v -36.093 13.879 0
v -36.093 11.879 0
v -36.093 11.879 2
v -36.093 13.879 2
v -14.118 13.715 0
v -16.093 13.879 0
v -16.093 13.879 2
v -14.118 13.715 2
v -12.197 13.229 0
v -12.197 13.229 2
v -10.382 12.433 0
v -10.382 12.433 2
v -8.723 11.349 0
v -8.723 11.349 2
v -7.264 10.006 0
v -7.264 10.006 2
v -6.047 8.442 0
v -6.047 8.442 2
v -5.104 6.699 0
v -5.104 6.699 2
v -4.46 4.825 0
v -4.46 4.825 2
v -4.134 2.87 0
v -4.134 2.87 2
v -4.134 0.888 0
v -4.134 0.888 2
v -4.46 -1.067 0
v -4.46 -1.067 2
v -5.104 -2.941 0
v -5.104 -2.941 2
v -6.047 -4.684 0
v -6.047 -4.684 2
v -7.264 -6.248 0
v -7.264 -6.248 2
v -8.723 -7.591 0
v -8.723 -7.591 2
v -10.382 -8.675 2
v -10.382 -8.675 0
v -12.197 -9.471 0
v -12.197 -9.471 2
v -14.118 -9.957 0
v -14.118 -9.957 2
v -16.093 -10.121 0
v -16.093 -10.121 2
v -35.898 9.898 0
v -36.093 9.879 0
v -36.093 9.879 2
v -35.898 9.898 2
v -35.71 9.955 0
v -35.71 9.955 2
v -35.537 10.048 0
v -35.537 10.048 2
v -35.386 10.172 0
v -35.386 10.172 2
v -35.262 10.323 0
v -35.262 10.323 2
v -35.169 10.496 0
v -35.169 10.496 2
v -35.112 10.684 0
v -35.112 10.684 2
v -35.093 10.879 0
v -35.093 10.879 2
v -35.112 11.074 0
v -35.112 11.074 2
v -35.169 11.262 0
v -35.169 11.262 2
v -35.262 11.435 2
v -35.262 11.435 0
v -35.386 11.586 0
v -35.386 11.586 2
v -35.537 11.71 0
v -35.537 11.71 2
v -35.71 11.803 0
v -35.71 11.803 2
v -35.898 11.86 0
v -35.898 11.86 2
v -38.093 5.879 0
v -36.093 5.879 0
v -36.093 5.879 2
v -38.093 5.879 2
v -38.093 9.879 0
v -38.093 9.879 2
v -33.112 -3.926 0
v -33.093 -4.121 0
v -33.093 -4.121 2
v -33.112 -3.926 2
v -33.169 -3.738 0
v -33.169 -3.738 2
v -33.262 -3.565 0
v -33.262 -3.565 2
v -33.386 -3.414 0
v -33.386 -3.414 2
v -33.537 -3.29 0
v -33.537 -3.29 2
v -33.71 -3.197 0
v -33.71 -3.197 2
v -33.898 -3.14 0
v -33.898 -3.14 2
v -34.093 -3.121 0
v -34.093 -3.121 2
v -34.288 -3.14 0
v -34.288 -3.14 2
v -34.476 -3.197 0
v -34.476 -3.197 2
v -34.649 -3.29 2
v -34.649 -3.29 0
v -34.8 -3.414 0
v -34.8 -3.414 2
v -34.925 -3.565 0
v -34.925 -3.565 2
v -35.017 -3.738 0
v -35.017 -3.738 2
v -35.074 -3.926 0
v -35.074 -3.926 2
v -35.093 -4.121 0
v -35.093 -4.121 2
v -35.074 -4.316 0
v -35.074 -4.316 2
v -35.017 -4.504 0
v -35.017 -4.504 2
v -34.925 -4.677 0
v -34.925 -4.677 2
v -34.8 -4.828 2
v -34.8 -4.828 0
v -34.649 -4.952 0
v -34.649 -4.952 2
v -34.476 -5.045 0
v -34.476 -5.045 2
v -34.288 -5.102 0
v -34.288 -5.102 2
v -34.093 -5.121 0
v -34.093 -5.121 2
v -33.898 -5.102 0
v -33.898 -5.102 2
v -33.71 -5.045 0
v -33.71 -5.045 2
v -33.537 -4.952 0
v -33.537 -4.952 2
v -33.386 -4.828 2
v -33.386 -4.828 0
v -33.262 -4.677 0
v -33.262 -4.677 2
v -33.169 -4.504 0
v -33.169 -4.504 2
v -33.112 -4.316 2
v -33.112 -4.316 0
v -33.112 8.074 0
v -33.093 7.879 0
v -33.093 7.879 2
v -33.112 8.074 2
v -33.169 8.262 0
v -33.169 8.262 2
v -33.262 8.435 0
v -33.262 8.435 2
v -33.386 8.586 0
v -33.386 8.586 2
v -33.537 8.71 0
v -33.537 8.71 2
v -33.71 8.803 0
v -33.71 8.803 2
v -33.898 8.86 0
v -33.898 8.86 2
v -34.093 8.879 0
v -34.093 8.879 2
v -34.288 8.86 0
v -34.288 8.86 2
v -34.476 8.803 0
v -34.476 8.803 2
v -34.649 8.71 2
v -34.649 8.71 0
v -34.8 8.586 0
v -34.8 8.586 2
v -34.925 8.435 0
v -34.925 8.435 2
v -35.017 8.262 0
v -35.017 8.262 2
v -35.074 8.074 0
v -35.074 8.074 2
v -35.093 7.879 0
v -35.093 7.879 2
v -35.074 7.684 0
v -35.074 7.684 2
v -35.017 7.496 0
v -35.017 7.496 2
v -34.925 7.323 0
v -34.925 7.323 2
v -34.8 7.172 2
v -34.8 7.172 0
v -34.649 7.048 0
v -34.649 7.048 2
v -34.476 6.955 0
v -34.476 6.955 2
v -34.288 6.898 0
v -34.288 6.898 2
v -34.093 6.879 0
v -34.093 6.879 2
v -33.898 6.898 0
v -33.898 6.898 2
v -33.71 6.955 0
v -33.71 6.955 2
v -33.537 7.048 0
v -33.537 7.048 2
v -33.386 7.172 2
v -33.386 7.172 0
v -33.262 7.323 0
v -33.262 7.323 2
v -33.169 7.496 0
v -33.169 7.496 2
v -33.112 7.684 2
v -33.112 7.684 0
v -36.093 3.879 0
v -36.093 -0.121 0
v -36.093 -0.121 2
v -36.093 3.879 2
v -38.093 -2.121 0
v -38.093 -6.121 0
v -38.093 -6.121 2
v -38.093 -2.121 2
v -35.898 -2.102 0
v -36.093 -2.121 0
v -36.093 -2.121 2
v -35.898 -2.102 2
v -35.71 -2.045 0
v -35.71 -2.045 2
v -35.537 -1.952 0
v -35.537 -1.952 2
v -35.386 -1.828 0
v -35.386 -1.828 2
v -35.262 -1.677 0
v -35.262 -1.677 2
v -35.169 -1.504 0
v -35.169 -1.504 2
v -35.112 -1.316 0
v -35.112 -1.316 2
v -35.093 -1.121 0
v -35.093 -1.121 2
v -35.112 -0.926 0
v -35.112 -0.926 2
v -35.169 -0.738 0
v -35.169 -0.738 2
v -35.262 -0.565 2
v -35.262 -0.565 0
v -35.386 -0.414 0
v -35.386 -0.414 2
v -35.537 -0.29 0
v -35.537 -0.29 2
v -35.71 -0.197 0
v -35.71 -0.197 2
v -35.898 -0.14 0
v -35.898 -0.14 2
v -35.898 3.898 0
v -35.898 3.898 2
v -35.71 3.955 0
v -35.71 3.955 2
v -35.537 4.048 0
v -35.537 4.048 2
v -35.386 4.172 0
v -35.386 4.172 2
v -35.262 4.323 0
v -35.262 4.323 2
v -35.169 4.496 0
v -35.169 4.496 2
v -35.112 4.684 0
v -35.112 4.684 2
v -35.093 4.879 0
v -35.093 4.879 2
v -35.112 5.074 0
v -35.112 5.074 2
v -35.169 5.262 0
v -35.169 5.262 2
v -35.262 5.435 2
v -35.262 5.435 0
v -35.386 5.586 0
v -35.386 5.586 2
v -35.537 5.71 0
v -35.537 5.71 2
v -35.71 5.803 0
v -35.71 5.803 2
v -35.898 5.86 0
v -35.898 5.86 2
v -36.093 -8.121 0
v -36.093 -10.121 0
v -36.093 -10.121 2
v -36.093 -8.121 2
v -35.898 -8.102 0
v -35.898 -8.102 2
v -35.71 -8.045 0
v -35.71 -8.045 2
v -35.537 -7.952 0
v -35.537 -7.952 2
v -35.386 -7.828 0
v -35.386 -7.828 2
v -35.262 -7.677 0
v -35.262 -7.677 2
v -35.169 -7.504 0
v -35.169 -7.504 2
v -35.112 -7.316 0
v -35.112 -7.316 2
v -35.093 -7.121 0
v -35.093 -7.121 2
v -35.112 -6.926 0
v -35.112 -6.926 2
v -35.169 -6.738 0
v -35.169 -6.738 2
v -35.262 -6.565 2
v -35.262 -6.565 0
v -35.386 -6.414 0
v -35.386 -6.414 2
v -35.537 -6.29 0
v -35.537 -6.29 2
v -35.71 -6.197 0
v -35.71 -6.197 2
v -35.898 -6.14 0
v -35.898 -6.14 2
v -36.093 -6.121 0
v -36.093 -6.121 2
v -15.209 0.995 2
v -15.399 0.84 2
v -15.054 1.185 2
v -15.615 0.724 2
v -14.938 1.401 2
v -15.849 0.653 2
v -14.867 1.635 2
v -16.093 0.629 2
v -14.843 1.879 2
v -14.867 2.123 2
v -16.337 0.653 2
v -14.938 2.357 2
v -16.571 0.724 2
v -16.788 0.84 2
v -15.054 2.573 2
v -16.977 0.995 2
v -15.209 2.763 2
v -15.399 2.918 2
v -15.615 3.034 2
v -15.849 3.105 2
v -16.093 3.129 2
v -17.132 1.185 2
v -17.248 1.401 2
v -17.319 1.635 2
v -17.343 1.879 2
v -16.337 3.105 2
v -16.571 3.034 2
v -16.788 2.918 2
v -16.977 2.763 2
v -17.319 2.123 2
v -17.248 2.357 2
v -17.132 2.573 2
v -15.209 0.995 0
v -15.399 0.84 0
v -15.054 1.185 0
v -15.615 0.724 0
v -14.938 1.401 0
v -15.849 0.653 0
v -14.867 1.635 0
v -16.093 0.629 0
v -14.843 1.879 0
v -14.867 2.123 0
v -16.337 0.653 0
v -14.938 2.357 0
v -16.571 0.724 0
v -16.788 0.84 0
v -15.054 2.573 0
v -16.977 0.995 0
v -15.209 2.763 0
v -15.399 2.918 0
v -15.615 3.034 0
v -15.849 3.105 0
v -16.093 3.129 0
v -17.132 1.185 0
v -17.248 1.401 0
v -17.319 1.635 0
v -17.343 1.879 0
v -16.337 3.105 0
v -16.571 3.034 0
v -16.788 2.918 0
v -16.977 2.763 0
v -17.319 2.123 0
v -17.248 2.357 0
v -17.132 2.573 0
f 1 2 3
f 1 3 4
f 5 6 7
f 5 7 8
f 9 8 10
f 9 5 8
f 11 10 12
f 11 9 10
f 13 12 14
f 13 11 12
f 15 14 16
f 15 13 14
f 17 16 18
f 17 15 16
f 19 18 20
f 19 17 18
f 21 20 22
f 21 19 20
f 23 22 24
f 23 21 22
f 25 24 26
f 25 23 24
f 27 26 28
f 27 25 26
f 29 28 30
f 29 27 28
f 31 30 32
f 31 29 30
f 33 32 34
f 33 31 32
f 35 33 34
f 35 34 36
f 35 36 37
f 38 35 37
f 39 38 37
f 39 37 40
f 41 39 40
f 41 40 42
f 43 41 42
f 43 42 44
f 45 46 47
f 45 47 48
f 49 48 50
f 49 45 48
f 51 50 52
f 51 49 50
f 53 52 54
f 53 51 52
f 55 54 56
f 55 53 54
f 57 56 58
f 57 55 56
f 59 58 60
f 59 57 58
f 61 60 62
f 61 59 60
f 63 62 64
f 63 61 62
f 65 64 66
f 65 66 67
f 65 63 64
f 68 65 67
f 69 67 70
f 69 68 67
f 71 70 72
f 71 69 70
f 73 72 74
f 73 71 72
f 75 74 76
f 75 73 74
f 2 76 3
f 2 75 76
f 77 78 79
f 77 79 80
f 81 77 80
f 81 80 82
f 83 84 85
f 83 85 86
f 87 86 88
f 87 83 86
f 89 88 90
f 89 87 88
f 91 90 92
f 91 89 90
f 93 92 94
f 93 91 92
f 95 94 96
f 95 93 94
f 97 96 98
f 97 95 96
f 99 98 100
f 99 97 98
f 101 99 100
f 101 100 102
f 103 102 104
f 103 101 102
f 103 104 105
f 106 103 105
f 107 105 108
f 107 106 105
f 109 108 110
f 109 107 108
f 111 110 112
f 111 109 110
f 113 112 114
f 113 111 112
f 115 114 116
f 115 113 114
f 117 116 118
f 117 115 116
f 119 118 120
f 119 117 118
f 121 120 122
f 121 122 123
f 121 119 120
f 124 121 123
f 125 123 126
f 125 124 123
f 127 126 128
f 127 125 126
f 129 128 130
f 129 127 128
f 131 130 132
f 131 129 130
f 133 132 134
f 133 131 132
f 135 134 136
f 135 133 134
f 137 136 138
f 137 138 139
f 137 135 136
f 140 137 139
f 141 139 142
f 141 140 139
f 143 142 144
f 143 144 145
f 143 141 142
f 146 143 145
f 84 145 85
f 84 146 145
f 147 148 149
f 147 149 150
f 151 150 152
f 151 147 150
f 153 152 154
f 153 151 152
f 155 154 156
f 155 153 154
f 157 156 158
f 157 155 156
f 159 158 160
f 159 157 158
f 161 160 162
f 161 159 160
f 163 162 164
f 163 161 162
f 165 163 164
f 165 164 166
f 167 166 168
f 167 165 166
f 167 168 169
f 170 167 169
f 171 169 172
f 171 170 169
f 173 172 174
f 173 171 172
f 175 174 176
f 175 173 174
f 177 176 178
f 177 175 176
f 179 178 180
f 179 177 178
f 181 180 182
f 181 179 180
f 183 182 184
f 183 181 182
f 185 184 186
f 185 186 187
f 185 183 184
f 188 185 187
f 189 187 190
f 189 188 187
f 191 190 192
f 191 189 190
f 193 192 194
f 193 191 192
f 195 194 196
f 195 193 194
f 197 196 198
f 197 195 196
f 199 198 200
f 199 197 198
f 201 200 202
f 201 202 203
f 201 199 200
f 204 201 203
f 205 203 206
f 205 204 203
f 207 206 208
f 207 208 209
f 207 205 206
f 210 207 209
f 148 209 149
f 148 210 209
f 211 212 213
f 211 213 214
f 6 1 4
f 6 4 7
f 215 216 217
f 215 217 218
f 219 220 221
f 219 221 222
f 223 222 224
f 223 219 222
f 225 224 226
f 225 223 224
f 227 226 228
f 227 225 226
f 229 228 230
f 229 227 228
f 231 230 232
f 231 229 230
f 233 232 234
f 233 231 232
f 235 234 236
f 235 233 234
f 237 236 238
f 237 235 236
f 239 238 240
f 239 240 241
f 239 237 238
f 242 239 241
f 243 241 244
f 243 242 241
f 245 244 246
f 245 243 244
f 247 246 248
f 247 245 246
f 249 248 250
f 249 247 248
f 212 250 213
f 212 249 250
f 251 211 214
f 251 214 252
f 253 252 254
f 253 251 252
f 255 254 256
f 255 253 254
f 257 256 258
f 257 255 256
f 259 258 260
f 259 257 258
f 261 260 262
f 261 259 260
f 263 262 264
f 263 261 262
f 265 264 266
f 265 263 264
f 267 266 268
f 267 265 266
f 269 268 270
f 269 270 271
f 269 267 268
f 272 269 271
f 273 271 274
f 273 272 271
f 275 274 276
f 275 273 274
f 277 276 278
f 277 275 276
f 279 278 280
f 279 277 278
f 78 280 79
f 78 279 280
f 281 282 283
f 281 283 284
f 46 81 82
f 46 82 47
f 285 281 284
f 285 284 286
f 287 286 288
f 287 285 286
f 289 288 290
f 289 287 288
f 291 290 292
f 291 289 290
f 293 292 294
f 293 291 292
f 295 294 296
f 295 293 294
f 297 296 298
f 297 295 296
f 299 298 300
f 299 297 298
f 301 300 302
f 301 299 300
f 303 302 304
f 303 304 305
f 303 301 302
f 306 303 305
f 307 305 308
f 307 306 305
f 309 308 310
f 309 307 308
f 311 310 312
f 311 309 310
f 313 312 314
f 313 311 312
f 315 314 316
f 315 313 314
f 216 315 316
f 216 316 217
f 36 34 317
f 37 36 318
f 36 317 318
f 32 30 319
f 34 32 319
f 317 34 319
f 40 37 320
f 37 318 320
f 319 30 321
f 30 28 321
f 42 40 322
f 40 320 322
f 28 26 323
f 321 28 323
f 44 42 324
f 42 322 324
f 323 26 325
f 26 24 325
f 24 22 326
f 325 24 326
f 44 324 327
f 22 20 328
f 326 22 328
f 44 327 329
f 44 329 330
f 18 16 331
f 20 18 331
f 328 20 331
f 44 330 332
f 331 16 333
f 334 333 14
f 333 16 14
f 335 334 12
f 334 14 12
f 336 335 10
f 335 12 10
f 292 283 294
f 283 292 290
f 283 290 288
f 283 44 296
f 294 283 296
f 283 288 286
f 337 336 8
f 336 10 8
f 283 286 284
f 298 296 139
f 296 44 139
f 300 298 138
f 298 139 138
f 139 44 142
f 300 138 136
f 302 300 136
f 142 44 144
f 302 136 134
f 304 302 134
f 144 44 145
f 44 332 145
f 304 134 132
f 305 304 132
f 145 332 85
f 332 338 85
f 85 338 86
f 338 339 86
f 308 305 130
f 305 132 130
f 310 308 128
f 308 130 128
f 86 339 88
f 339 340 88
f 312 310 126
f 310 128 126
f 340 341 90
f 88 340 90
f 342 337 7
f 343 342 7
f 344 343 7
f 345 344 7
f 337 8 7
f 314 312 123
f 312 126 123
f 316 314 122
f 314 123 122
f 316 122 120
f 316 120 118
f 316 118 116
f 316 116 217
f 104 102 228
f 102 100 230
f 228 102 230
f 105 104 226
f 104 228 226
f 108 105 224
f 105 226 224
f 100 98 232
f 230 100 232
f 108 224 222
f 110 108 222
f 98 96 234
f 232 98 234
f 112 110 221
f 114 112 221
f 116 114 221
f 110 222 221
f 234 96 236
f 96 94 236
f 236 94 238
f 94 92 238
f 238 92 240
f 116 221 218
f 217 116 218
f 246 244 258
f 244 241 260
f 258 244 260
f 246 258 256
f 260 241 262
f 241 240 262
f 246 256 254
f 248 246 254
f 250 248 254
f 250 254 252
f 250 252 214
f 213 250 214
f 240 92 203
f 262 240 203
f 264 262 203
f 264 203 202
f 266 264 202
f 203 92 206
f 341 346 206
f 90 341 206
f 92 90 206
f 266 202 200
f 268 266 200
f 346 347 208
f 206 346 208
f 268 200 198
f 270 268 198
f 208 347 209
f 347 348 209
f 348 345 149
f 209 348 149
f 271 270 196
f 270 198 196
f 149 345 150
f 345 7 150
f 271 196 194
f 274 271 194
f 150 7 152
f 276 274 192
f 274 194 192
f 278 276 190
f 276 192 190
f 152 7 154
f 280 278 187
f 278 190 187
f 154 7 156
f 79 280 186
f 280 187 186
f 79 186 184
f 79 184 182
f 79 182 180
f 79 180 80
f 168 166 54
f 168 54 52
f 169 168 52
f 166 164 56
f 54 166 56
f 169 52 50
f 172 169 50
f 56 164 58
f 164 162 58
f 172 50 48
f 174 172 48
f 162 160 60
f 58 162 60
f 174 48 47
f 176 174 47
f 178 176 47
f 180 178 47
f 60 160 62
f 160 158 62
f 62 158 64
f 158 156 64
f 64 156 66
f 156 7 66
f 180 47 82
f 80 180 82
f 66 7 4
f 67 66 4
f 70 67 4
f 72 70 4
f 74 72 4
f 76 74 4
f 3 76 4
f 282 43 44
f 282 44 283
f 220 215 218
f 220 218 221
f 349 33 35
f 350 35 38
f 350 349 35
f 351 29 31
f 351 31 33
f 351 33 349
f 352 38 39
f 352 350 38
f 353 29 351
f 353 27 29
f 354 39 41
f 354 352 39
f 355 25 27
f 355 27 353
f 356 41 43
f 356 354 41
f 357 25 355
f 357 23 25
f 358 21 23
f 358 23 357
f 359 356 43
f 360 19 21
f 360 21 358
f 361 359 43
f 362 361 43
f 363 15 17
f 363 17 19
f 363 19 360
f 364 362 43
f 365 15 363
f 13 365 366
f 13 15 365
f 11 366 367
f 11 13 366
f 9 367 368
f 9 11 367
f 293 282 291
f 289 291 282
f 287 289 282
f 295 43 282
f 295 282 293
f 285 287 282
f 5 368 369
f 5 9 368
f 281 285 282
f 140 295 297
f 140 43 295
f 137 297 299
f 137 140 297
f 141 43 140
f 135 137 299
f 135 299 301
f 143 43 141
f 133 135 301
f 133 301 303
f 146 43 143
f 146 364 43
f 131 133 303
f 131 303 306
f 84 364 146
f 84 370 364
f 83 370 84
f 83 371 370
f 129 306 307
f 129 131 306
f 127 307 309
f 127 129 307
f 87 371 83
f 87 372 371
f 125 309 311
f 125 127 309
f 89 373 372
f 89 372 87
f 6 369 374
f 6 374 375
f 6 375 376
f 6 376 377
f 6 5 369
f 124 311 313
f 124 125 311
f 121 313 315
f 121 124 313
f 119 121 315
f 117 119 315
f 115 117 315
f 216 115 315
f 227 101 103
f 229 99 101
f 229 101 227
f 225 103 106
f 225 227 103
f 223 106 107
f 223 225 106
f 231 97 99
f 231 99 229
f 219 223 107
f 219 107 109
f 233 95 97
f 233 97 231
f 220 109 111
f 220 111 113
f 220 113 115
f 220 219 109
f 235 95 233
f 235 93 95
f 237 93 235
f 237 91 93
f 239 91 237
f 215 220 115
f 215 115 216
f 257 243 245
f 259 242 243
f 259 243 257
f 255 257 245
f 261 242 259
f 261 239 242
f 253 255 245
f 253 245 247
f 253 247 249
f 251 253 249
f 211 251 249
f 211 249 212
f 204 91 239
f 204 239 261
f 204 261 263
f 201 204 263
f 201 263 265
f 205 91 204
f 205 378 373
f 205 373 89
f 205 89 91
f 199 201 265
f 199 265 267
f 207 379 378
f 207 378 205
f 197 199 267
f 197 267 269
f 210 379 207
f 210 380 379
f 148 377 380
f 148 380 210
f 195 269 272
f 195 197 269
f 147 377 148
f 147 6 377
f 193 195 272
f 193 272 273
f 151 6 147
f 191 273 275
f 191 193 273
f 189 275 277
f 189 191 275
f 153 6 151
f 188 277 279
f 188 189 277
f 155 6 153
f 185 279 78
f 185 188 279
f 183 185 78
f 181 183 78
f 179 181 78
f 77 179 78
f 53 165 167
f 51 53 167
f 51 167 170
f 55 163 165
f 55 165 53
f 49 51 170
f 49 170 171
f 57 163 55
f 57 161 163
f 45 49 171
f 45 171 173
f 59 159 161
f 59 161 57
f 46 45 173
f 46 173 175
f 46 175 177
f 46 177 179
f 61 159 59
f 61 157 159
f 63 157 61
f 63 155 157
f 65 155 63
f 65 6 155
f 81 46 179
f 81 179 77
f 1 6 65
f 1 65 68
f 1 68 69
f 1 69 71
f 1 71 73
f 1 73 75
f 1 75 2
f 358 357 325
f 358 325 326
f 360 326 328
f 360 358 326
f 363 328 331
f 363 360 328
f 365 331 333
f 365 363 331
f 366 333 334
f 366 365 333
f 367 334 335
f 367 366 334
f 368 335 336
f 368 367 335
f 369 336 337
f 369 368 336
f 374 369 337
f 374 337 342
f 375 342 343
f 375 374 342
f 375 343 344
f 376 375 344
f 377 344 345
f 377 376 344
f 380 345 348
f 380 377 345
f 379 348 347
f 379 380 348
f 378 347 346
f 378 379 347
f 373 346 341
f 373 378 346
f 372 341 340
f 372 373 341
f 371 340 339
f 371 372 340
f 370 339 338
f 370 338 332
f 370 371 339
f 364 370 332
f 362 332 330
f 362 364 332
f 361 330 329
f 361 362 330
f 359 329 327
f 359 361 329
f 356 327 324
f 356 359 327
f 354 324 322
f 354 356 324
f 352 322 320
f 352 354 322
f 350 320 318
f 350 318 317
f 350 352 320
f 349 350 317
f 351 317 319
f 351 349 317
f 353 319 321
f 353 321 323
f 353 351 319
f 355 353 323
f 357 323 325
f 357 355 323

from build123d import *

# Parameters (mm, degrees)
SKETCH_1_R      = 1.25
SKETCH_1_R_2    = 1
EXTRUDE_1_DEPTH = 2


with BuildPart() as part:
    # 草圖1 → 填料-伸長1 (new body)
    with BuildSketch(Plane.XY):
        with BuildLine():
            Line((-36.093061493, 13.879025542), (-16.093061493, 13.879025542))
            ThreePointArc((-16.093061493, 13.879025542), (-4.093061493, 1.879025542), (-16.093061493, -10.120974458))
            Line((-16.093061493, -10.120974458), (-36.093061493, -10.120974458))
            Line((-36.093061493, -10.120974458), (-36.093061493, -8.120974458))
            ThreePointArc((-36.093061493, -8.120974458), (-35.093061493, -7.120974458), (-36.093061493, -6.120974458))
            Line((-36.093061493, -6.120974458), (-38.093061493, -6.120974458))
            Line((-38.093061493, -6.120974458), (-38.093061493, -2.120974458))
            Line((-38.093061493, -2.120974458), (-36.093061493, -2.120974458))
            ThreePointArc((-36.093061493, -2.120974458), (-35.093061493, -1.120974458), (-36.093061493, -0.120974458))
            Line((-36.093061493, -0.120974458), (-36.093061493, 3.879025542))
            ThreePointArc((-36.093061493, 3.879025542), (-35.093061493, 4.879025542), (-36.093061493, 5.879025542))
            Line((-36.093061493, 5.879025542), (-38.093061493, 5.879025542))
            Line((-38.093061493, 5.879025542), (-38.093061493, 9.879025542))
            Line((-38.093061493, 9.879025542), (-36.093061493, 9.879025542))
            ThreePointArc((-36.093061493, 9.879025542), (-35.093061493, 10.879025542), (-36.093061493, 11.879025542))
            Line((-36.093061493, 11.879025542), (-36.093061493, 13.879025542))
        make_face()
        with Locations((-16.093061493, 1.879025542)):
            Circle(SKETCH_1_R, mode=Mode.SUBTRACT)
        with Locations((-34.093061493, 7.879025542)):
            Circle(SKETCH_1_R_2, mode=Mode.SUBTRACT)
        with Locations((-34.093061493, -4.120974458)):
            Circle(SKETCH_1_R_2, mode=Mode.SUBTRACT)
    extrude(amount=EXTRUDE_1_DEPTH)


solid = part.part
